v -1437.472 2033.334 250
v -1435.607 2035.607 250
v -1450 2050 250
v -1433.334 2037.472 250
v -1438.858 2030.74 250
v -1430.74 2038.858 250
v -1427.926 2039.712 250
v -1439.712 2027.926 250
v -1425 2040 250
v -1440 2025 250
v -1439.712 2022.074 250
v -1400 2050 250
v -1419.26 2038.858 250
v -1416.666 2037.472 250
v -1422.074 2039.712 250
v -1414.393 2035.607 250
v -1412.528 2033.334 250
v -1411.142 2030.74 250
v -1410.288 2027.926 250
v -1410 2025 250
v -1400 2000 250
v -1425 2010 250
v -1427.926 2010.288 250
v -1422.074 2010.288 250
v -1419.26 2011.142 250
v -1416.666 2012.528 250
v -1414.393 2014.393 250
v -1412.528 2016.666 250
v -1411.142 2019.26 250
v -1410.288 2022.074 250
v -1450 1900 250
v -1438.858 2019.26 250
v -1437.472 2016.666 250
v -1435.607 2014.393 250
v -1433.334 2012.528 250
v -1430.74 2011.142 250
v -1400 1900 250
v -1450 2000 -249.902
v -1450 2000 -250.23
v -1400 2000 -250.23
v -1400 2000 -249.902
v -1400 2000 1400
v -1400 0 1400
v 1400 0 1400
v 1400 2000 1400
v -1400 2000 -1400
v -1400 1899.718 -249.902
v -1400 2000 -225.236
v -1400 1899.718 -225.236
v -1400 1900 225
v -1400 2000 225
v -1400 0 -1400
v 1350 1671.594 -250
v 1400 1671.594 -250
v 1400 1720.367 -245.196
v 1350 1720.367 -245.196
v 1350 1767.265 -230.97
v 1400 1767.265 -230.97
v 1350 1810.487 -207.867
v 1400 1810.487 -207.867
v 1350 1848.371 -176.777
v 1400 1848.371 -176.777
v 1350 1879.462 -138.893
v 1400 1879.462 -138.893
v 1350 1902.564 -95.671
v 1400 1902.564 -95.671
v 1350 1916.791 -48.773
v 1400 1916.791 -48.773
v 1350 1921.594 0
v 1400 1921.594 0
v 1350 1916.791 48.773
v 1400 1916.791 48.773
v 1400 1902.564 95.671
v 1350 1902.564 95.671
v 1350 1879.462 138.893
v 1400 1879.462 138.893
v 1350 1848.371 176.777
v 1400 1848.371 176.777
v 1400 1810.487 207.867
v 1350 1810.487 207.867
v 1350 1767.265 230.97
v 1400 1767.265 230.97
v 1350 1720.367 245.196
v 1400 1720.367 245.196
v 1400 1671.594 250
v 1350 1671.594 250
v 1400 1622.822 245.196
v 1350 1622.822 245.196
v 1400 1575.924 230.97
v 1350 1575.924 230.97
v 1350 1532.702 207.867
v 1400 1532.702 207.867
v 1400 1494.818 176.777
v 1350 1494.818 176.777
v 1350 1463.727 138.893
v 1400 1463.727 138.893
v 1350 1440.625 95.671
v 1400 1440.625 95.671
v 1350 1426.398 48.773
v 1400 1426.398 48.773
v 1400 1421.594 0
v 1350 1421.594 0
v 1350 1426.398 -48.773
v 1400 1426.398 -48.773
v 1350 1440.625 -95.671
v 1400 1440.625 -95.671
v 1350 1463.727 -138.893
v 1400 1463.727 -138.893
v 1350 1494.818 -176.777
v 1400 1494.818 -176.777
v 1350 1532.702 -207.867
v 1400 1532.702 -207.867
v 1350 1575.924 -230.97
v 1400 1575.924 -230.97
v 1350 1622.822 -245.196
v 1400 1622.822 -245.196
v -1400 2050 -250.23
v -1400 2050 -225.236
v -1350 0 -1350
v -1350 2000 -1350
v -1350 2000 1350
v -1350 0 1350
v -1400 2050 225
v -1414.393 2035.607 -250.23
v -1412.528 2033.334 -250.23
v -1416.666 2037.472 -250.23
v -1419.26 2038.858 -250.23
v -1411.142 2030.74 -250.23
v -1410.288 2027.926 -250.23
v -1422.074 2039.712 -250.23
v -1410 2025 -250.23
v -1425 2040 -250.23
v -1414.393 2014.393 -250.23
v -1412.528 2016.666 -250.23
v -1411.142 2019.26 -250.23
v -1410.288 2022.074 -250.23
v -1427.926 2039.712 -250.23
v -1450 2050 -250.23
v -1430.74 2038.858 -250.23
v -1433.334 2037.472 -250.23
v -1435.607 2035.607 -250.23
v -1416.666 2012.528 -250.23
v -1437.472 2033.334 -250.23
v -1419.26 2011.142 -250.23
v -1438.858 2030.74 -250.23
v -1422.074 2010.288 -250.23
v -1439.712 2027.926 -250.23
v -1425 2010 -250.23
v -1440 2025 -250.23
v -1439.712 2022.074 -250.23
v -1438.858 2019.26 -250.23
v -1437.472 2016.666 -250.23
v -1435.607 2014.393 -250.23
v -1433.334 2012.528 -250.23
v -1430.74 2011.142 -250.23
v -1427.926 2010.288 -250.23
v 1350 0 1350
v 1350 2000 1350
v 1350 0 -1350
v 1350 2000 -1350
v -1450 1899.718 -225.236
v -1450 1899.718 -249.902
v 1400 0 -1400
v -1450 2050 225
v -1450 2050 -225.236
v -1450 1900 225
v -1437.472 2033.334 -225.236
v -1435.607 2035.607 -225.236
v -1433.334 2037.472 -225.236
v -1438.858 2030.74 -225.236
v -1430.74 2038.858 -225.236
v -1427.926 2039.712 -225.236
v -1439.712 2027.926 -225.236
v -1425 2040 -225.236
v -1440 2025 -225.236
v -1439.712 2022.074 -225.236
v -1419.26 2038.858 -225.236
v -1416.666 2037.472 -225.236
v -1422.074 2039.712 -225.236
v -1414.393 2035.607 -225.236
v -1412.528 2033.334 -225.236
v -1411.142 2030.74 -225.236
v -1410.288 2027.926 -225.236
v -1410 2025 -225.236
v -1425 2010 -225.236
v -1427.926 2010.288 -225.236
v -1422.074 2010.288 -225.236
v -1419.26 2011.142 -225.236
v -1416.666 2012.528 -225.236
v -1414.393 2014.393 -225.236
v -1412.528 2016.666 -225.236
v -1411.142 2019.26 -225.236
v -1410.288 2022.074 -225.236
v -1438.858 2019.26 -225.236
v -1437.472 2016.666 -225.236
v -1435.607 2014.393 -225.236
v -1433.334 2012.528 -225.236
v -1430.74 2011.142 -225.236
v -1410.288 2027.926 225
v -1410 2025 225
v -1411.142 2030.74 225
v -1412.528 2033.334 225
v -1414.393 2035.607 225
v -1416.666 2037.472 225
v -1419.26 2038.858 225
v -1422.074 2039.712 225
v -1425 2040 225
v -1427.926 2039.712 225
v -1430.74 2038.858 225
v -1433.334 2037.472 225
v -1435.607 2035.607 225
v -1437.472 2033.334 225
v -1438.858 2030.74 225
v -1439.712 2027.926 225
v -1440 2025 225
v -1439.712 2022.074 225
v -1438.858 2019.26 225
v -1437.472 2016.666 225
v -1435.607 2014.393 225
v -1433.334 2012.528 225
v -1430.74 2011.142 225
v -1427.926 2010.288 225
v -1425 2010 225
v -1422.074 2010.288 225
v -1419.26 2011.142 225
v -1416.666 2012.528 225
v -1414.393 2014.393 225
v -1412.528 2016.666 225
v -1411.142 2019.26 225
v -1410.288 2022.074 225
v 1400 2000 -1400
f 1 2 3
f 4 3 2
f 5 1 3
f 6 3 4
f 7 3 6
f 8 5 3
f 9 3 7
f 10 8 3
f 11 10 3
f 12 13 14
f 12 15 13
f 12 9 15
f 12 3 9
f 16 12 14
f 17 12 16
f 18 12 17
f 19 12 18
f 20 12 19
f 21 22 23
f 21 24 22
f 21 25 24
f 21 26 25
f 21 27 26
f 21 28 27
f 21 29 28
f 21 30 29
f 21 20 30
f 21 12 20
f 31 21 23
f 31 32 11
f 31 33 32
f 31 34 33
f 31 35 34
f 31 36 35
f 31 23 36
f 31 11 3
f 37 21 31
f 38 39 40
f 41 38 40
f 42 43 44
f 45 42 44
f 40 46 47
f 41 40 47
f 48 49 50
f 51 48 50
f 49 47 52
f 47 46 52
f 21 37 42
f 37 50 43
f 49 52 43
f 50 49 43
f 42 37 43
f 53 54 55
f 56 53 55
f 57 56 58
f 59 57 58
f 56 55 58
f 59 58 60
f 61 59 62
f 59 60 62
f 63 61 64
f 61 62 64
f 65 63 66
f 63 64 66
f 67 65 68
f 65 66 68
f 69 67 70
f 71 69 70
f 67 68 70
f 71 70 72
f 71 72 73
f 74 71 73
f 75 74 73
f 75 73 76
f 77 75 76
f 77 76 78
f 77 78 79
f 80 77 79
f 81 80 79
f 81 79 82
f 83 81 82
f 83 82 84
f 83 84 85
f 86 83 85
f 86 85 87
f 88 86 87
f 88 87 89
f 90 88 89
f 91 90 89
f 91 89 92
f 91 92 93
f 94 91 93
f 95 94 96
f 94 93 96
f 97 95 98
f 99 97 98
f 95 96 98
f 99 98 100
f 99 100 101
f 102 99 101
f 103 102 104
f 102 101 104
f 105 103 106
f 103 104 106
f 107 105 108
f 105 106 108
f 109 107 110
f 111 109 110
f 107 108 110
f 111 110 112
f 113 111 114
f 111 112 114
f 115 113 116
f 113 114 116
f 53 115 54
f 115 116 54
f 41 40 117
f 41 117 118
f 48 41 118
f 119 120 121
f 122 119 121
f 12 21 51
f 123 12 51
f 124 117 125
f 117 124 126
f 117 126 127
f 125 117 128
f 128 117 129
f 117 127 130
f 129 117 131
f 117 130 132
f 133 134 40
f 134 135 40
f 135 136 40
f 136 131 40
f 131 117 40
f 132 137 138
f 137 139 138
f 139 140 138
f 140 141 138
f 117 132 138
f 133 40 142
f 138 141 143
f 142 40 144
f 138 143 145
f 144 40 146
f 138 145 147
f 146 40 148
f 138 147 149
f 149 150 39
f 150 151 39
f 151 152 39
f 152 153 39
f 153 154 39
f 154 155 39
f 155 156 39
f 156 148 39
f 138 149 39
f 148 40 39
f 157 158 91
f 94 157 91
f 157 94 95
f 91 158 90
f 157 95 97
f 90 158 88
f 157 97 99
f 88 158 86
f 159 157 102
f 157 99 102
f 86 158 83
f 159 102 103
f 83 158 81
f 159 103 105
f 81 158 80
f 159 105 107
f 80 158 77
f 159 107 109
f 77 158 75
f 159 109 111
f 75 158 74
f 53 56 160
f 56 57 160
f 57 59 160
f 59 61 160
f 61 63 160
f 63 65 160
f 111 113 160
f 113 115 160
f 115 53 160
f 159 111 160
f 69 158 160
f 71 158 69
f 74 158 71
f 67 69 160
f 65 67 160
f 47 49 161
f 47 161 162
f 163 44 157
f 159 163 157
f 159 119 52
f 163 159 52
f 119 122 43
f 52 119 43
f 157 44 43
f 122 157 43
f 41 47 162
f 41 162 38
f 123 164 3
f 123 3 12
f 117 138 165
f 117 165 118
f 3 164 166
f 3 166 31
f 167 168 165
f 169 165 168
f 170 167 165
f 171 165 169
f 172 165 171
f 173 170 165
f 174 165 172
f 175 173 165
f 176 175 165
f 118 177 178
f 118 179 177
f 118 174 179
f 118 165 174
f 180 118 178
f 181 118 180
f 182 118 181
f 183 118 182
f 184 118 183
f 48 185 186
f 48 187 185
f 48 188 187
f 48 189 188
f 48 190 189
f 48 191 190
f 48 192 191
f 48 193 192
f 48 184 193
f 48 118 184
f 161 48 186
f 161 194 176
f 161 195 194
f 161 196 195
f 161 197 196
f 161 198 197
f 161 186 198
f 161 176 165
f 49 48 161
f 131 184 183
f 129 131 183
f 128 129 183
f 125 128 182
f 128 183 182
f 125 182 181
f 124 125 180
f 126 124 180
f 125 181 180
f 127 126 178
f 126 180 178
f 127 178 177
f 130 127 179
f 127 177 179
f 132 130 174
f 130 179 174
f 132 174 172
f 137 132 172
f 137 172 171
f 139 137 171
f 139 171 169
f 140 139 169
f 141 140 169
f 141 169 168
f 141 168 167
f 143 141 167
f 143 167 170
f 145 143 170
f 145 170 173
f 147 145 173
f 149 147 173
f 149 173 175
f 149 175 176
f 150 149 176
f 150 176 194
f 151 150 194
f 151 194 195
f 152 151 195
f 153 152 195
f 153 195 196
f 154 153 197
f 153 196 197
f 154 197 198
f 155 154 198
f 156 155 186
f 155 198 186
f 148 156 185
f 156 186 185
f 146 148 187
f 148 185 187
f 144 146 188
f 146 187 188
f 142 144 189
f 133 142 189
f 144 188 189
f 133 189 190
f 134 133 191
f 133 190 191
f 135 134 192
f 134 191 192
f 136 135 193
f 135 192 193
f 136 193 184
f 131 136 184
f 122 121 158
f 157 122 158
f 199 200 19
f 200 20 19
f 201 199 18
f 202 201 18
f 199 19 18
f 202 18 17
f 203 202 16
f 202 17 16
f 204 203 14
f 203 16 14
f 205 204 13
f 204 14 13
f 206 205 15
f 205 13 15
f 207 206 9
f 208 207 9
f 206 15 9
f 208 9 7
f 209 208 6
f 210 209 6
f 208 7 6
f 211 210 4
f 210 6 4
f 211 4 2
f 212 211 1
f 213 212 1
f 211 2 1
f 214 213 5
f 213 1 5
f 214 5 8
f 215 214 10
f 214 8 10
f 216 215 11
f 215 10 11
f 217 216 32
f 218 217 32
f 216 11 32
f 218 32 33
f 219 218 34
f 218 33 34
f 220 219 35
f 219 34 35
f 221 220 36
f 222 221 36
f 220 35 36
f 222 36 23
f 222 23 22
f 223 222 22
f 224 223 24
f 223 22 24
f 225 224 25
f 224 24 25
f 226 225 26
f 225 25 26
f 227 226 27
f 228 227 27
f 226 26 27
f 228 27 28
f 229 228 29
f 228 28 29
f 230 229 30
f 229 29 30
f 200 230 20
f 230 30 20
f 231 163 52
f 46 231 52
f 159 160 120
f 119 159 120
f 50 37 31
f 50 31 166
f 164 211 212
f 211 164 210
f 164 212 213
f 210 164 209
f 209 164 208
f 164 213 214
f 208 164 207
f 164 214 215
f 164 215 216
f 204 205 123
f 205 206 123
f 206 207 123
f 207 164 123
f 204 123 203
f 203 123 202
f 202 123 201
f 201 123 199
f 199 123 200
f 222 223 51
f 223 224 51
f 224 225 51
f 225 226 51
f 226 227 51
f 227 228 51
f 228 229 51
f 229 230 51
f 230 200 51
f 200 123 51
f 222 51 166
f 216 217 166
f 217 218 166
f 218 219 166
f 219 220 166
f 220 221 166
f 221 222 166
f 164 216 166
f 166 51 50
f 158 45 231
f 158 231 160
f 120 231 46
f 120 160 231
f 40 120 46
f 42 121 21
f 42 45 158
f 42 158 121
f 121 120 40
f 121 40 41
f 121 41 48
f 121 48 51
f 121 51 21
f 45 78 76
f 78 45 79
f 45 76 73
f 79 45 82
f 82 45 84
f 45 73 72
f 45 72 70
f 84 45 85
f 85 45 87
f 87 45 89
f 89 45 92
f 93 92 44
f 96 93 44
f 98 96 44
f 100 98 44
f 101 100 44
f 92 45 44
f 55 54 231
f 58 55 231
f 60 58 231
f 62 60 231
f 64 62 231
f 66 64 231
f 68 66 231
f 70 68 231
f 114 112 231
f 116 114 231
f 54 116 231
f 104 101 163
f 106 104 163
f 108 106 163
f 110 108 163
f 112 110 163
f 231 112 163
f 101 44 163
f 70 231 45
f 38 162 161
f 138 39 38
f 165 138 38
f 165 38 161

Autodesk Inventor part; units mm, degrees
ref_plane "YZ Plane" through (0, 0, 0) normal (1, 0, 0) x (0, 1, 0)
ref_plane "XZ Plane" through (0, 0, 0) normal (0, 1, 0) x (-1, 0, 0)
ref_plane "XY Plane" through (0, 0, 0) normal (0, 0, 1) x (1, 0, 0)
sketch "Sketch1" plane through (0, 0, 0) normal (0, 1, 0) x (-1, 0, 0)
  line L0 (1400, 1400) -> (-1400, 1400)
  line L1 (-1400, 1400) -> (-1400, -1400)
  line L2 (-1400, -1400) -> (1400, -1400)
  line L3 (1400, -1400) -> (1400, 1400)
  point P0 (0, 0)
  dimension "d0" = 2800
  dimension "d1" = 2800
  dimension "d2" = 1400
  dimension "d3" = 1400
extrude "Extrusion1" add sketch "Sketch1" along normal blind 2000
sketch "Sketch2" plane through (1400, 0, 1400) normal (1, 0, 0) x (0, 0, -1)
  circle A0 centre (1400, 1671.5944) radius 250
  point P0 (1400, 0)
  dimension "d6" = 500
extrude "Extrusion2" cut sketch "Sketch2" against normal blind 2000
sketch "Sketch3" plane through (0, 2000, 0) normal (0, 1, 0) x (1, 0, 0)
  line L0 (-1350, -1350) -> (1350, -1350)
  line L1 (1350, -1350) -> (1350, 1350)
  line L2 (1350, 1350) -> (-1350, 1350)
  line L3 (-1350, 1350) -> (-1350, -1350)
  point P0 (0, 0)
  dimension "d9" = 2700
  dimension "d10" = 2700
  dimension "d11" = 1350
  dimension "d12" = 1350
extrude "Extrusion3" cut sketch "Sketch3" against normal blind 2000
sketch "Sketch7" plane through (-1400, 0, -1400) normal (-1, 0, 0) x (0, 0, 1)
  line L0 (2800, 2000) -> (0, 2000) projected
  line L1 (1650, 1900) -> (1150, 1900)
  line L2 (1150, 1900) -> (1150, 2000)
  line L3 (1150, 2000) -> (1650, 2000)
  line L4 (1650, 2000) -> (1650, 1900)
  line L5 (2800, 0) -> (2800, 2000) projected
  line L6 (2750, 2000) -> (50, 2000) projected
  line L7 (1625, 1900) -> (1175, 1900)
  line L8 (1175, 1900) -> (1175, 2000)
  line L9 (1175, 2000) -> (1625, 2000)
  line L10 (1625, 2000) -> (1625, 1900)
  point P0 (1400, 0)
  dimension "d22" = 500
  dimension "d23" = 1150
  dimension "d24" = 100
  dimension "d25" = 450
  dimension "d26" = 25
sketch "Sketch8" plane through (-1400, 0, -1400) normal (-1, 0, 0) x (0, 0, 1)
  line L0 (2800, 2000) -> (0, 2000) projected
  line L1 (1174.764, 1899.7185) -> (1150.0977, 1899.7185)
  line L2 (1150.0977, 1899.7185) -> (1150.0977, 2000)
  line L3 (1150.0977, 2000) -> (1174.764, 2000)
  line L4 (1174.764, 2000) -> (1174.764, 1899.7185)
  point P0 (1400, 0)
extrude "Extrusion7" add sketch "Sketch7" along normal blind 50 contours L4 L1 L10 L0
extrude "Extrusion8" add sketch "Sketch8" along normal blind 50
sketch "Sketch10" plane through (0, 2000, 0) normal (0, 1, 0) x (1, 0, 0)
  line L0 (-1400, -250) -> (-1450, -250) projected
  line L1 (-1400, -225) -> (-1450, -225) projected
  line L2 (-1450, -250) -> (-1400, -250)
  line L3 (-1400, -250) -> (-1400, -225)
  line L4 (-1400, -225) -> (-1450, -225)
  line L5 (-1450, -225) -> (-1450, -250)
  line L6 (-1400, 225.236) -> (-1450, 225.236) projected
  line L7 (-1400, 1400) -> (-1400, -1400) projected
  line L8 (-1450, 225.236) -> (-1400, 225.236)
  line L9 (-1400, 225.236) -> (-1400, 250.2305)
  line L10 (-1400, 250.2305) -> (-1450, 250.2305)
  line L11 (-1450, 250.2305) -> (-1450, 225.236)
  point P0 (0, 0)
extrude "Extrusion9" add sketch "Sketch10" along normal blind 50
sketch "Sketch11" plane through (-1450, 1900, 250) normal (0, 0, 1) x (1, 0, 0)
  circle A0 centre (25, 125) radius 15
  line L0 (50, 100) -> (50, 150) projected
  point P0 (1450, -1900)
  dimension "d33" = 30
  dimension "d34" = 10
extrude "Extrusion10" cut sketch "Sketch11" against normal blind 700
properties part number "cube bucket new"
